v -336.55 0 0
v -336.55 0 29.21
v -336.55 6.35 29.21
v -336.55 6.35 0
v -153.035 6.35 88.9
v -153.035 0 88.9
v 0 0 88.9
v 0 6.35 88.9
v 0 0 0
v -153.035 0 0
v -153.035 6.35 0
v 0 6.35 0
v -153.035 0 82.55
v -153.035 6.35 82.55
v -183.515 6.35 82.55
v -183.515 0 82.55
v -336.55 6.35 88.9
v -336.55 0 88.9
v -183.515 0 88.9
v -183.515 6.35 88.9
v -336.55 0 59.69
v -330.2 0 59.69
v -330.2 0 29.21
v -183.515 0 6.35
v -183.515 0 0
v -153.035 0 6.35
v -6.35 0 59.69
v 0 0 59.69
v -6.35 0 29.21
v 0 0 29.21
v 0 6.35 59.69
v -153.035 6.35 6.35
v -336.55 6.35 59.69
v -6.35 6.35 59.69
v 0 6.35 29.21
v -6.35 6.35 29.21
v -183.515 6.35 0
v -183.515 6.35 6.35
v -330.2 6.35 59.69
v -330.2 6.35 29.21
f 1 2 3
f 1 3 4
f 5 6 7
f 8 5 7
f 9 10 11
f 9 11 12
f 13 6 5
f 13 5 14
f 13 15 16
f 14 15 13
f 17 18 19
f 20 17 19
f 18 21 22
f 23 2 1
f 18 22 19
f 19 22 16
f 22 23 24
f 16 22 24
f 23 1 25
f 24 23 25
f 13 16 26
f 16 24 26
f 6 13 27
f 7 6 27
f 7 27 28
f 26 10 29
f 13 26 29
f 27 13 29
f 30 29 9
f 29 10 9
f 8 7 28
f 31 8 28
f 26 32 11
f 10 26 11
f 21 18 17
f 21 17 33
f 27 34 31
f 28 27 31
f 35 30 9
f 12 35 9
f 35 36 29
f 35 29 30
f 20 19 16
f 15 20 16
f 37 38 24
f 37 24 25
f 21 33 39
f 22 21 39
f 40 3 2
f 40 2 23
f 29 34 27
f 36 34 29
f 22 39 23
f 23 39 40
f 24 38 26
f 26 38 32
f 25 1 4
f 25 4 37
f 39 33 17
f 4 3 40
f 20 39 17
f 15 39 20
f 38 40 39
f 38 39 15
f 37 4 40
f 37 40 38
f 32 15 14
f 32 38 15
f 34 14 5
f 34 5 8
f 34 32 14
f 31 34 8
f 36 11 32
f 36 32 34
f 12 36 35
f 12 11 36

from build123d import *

# Parameters (mm, degrees)
SKETCH1_W           = 336.55
SKETCH1_H           = 88.9
BOSS_EXTRUDE1_DEPTH = 6.35
SKETCH2_W           = 30.48
SKETCH2_H           = 6.35
SKETCH2_W_2         = 6.35
SKETCH2_H_2         = 30.48
CUT_EXTRUDE1_DEPTH  = 7.35


with BuildPart() as part:
    # Sketch1 → Boss-Extrude1 (new body)
    with BuildSketch(Plane(origin=(0, 0, 0), x_dir=(1, 0, 0), z_dir=(0, 1, 0))):
        with Locations((-168.275, -44.45)):
            Rectangle(SKETCH1_W, SKETCH1_H)
    extrude(amount=BOSS_EXTRUDE1_DEPTH)

    # Sketch2 → Cut-Extrude1 (cut, through all)
    with BuildSketch(Plane(origin=(0, 6.35, 0), x_dir=(1, 0, 0), z_dir=(0, 1, 0))):
        with Locations((-168.275, -3.175)):
            Rectangle(SKETCH2_W, SKETCH2_H)
        with Locations((-168.275, -85.725)):
            Rectangle(SKETCH2_W, SKETCH2_H)
        with Locations((-3.175, -44.45)):
            Rectangle(SKETCH2_W_2, SKETCH2_H_2)
        with Locations((-333.375, -44.45)):
            Rectangle(SKETCH2_W_2, SKETCH2_H_2)
    extrude(amount=-CUT_EXTRUDE1_DEPTH, mode=Mode.SUBTRACT)


solid = part.part
